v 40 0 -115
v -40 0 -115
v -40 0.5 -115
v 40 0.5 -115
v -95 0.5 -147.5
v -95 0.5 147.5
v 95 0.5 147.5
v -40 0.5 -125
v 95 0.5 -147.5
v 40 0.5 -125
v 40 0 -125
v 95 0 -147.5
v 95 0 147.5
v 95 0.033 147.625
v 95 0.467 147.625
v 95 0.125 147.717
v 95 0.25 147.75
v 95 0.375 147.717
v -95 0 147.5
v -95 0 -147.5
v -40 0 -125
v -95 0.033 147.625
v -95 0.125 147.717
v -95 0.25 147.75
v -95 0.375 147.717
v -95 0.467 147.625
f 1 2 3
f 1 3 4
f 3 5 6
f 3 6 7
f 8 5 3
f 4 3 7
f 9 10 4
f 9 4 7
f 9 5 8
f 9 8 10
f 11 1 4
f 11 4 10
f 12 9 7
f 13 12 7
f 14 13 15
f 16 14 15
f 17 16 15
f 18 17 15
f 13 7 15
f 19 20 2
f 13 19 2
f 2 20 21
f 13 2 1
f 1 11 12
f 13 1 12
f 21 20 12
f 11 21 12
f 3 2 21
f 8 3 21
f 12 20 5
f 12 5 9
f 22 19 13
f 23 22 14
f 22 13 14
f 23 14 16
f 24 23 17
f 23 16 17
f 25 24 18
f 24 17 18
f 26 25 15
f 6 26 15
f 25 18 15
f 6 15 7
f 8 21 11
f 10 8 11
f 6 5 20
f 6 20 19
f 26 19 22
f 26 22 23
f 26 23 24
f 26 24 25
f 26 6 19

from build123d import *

# Parameters (mm, degrees)
SKETCH1_W           = 190
SKETCH1_H           = 295
SKETCH1_W_2         = 80
SKETCH1_H_2         = 10
BOSS_EXTRUDE1_DEPTH = 0.5
BOSS_EXTRUDE2_DEPTH = 190


with BuildPart() as part:
    # Sketch1 → Boss-Extrude1 (new body)
    with BuildSketch(Plane(origin=(0, 0, 0), x_dir=(1, 0, 0), z_dir=(0, 1, 0))):
        Rectangle(SKETCH1_W, SKETCH1_H)
        with Locations((0, 120)):
            Rectangle(SKETCH1_W_2, SKETCH1_H_2, mode=Mode.SUBTRACT)
    extrude(amount=BOSS_EXTRUDE1_DEPTH)

    # Sketch2 → Boss-Extrude2 (add)
    with BuildSketch(Plane(origin=(95, 0, 0), x_dir=(0, 0, -1), z_dir=(1, 0, 0))):
        with BuildLine():
            Line((-147.5, 0.5), (-147.5, 0))
            ThreePointArc((-147.5, 0), (-147.75, 0.25), (-147.5, 0.5))
        make_face()
    extrude(amount=-BOSS_EXTRUDE2_DEPTH)


solid = part.part
